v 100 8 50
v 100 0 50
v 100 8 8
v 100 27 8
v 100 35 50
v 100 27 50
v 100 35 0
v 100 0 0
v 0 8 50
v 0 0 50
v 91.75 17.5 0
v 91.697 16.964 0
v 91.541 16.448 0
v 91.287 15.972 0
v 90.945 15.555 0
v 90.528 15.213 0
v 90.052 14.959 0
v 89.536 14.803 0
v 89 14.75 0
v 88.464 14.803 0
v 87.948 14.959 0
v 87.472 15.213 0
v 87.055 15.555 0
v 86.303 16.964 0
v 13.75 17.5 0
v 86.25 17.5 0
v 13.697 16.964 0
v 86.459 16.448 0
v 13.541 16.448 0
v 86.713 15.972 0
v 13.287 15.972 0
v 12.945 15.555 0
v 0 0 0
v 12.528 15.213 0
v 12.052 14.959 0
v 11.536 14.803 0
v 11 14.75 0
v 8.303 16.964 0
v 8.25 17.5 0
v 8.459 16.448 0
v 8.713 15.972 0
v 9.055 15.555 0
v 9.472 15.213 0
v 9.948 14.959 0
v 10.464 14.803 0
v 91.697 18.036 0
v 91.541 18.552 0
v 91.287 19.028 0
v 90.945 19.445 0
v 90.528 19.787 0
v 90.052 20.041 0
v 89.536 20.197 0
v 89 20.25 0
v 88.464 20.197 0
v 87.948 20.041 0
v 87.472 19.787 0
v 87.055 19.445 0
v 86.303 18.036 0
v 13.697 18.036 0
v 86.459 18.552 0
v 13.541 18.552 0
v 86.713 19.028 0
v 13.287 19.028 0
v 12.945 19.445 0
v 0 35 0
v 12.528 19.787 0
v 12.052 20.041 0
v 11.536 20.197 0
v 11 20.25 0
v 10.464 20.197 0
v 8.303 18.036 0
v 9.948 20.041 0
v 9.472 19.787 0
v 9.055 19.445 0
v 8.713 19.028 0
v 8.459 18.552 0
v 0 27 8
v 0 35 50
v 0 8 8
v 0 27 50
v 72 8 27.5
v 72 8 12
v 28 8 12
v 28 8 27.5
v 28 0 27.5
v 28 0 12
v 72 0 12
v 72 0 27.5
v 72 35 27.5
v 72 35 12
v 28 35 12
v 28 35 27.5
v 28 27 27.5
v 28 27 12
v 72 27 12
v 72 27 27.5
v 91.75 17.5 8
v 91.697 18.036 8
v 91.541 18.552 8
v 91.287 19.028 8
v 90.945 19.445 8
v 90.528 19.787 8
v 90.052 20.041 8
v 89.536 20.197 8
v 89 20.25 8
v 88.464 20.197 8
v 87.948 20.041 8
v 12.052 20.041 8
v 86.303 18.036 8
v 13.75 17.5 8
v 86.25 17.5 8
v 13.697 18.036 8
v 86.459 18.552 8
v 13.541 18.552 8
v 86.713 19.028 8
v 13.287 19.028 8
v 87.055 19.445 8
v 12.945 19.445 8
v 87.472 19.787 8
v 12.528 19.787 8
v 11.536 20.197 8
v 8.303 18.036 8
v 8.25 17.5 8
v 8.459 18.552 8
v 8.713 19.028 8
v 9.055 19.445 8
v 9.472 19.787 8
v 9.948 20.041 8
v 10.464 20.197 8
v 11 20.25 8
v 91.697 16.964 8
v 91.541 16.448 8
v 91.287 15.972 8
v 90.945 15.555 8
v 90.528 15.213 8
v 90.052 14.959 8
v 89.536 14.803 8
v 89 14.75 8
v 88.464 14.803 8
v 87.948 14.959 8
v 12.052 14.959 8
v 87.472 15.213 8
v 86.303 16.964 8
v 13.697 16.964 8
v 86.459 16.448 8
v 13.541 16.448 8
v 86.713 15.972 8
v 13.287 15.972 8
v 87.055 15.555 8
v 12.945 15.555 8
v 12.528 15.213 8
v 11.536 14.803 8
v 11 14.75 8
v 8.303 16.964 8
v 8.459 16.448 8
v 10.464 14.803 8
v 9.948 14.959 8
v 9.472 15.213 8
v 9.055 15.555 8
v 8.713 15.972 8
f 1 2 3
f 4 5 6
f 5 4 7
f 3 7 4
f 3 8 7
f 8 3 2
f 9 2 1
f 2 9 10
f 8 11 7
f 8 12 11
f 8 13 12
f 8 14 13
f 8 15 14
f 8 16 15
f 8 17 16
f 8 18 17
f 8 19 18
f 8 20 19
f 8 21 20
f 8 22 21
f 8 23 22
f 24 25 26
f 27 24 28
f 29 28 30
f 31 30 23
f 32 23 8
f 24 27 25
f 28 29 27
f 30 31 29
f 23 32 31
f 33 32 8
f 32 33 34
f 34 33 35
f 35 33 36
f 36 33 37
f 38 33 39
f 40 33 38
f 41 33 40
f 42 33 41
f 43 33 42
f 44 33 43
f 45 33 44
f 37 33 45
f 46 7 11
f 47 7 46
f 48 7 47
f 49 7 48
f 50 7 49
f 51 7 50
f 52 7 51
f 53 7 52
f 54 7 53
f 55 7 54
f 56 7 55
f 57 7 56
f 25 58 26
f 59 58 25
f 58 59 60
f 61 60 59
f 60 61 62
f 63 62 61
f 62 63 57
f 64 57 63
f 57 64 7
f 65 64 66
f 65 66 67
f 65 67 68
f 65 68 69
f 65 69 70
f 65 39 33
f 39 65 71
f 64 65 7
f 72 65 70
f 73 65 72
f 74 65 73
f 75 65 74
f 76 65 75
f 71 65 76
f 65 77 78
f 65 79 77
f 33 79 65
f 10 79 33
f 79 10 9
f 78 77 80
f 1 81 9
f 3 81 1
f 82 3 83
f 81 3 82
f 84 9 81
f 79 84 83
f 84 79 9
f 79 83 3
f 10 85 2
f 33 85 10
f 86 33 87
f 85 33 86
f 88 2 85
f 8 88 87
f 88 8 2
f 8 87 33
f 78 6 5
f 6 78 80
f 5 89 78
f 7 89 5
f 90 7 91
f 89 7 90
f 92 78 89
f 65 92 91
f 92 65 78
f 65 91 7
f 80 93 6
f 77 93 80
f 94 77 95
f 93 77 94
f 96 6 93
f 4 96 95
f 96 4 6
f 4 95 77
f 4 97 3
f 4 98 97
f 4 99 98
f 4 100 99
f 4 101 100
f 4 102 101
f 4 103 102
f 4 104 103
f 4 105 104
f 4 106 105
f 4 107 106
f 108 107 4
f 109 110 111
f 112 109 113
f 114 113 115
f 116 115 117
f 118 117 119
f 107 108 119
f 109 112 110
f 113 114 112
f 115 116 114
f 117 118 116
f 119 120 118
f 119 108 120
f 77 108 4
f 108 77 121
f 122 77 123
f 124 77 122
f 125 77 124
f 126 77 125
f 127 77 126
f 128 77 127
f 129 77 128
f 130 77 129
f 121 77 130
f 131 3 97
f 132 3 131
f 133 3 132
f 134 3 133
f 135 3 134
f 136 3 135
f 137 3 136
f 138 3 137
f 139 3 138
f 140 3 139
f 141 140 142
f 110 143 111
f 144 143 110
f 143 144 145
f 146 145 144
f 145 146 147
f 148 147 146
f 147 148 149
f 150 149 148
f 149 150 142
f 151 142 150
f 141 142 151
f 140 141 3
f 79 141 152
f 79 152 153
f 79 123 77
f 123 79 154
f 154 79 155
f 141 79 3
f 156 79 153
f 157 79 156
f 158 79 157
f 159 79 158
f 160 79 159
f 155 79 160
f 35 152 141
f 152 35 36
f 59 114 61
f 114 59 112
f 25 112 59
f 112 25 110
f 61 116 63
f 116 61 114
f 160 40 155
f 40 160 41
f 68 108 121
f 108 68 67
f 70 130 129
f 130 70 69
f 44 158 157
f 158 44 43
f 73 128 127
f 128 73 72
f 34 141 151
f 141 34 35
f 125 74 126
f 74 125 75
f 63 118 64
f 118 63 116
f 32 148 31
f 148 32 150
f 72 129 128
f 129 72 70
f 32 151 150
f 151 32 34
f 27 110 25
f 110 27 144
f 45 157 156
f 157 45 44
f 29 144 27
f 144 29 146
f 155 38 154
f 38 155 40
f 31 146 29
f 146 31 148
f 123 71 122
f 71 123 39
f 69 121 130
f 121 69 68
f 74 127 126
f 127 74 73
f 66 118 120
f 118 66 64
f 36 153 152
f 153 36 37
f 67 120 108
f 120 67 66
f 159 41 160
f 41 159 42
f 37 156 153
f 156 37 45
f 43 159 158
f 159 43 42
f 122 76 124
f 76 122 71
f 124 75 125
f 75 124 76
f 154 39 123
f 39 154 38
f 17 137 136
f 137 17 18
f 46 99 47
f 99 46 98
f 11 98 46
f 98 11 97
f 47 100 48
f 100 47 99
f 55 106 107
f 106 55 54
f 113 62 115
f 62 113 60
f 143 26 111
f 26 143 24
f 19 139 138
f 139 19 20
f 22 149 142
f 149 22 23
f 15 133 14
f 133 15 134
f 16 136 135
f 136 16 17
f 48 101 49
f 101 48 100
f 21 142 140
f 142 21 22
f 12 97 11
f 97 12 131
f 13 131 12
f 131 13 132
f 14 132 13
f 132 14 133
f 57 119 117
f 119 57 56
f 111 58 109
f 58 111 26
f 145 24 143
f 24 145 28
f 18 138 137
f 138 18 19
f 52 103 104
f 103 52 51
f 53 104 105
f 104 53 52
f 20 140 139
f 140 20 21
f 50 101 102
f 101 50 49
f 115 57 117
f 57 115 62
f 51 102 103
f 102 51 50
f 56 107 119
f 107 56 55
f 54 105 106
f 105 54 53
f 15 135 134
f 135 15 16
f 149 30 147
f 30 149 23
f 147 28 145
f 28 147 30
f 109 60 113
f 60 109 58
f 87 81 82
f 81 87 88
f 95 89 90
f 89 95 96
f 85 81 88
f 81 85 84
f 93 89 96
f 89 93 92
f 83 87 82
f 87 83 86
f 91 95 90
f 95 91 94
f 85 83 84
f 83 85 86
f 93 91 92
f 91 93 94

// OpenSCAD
$fn = 32;

// ----------------------------------------------------------------------
// U-bracket: 100 x 35 x 50 mm
// ----------------------------------------------------------------------

// --- parameters (mm) ---
rail_len = 100;           // outer length, X
jaw_w = 35;               // outer width, Y
jaw_h = 50;               // upright height, Z
web_t = 8;                // wall thickness
hole_d = 5.5;             // clearance for M5
window_l = 44;            // window length
window_h = 15.5;          // window height

module hole_z(px, py) {
  translate([px, py, -0.5]) cylinder(h = web_t + 1, d = hole_d);
}
module hole_y_pz(pz) {
  /* through both uprights along Y */
  translate([0, -0.5, pz]) rotate([-90, 0, 0]) cylinder(h = jaw_w + 1, d = hole_d);
}

module base() {
  cube([rail_len, jaw_w, web_t]);
}

module uprights() {
  cube([rail_len, web_t, jaw_h]);
  translate([0, jaw_w - web_t, 0]) cube([rail_len, web_t, jaw_h]);
}

difference() {
  union() {
    base();
    uprights();
  }
  hole_z(11, 17.5);
  hole_z(89, 17.5);
  /* lightening window through both uprights */
  translate([rail_len / 2 - window_l / 2, -1, web_t + 4])
    cube([window_l, jaw_w + 2, window_h]);
}
